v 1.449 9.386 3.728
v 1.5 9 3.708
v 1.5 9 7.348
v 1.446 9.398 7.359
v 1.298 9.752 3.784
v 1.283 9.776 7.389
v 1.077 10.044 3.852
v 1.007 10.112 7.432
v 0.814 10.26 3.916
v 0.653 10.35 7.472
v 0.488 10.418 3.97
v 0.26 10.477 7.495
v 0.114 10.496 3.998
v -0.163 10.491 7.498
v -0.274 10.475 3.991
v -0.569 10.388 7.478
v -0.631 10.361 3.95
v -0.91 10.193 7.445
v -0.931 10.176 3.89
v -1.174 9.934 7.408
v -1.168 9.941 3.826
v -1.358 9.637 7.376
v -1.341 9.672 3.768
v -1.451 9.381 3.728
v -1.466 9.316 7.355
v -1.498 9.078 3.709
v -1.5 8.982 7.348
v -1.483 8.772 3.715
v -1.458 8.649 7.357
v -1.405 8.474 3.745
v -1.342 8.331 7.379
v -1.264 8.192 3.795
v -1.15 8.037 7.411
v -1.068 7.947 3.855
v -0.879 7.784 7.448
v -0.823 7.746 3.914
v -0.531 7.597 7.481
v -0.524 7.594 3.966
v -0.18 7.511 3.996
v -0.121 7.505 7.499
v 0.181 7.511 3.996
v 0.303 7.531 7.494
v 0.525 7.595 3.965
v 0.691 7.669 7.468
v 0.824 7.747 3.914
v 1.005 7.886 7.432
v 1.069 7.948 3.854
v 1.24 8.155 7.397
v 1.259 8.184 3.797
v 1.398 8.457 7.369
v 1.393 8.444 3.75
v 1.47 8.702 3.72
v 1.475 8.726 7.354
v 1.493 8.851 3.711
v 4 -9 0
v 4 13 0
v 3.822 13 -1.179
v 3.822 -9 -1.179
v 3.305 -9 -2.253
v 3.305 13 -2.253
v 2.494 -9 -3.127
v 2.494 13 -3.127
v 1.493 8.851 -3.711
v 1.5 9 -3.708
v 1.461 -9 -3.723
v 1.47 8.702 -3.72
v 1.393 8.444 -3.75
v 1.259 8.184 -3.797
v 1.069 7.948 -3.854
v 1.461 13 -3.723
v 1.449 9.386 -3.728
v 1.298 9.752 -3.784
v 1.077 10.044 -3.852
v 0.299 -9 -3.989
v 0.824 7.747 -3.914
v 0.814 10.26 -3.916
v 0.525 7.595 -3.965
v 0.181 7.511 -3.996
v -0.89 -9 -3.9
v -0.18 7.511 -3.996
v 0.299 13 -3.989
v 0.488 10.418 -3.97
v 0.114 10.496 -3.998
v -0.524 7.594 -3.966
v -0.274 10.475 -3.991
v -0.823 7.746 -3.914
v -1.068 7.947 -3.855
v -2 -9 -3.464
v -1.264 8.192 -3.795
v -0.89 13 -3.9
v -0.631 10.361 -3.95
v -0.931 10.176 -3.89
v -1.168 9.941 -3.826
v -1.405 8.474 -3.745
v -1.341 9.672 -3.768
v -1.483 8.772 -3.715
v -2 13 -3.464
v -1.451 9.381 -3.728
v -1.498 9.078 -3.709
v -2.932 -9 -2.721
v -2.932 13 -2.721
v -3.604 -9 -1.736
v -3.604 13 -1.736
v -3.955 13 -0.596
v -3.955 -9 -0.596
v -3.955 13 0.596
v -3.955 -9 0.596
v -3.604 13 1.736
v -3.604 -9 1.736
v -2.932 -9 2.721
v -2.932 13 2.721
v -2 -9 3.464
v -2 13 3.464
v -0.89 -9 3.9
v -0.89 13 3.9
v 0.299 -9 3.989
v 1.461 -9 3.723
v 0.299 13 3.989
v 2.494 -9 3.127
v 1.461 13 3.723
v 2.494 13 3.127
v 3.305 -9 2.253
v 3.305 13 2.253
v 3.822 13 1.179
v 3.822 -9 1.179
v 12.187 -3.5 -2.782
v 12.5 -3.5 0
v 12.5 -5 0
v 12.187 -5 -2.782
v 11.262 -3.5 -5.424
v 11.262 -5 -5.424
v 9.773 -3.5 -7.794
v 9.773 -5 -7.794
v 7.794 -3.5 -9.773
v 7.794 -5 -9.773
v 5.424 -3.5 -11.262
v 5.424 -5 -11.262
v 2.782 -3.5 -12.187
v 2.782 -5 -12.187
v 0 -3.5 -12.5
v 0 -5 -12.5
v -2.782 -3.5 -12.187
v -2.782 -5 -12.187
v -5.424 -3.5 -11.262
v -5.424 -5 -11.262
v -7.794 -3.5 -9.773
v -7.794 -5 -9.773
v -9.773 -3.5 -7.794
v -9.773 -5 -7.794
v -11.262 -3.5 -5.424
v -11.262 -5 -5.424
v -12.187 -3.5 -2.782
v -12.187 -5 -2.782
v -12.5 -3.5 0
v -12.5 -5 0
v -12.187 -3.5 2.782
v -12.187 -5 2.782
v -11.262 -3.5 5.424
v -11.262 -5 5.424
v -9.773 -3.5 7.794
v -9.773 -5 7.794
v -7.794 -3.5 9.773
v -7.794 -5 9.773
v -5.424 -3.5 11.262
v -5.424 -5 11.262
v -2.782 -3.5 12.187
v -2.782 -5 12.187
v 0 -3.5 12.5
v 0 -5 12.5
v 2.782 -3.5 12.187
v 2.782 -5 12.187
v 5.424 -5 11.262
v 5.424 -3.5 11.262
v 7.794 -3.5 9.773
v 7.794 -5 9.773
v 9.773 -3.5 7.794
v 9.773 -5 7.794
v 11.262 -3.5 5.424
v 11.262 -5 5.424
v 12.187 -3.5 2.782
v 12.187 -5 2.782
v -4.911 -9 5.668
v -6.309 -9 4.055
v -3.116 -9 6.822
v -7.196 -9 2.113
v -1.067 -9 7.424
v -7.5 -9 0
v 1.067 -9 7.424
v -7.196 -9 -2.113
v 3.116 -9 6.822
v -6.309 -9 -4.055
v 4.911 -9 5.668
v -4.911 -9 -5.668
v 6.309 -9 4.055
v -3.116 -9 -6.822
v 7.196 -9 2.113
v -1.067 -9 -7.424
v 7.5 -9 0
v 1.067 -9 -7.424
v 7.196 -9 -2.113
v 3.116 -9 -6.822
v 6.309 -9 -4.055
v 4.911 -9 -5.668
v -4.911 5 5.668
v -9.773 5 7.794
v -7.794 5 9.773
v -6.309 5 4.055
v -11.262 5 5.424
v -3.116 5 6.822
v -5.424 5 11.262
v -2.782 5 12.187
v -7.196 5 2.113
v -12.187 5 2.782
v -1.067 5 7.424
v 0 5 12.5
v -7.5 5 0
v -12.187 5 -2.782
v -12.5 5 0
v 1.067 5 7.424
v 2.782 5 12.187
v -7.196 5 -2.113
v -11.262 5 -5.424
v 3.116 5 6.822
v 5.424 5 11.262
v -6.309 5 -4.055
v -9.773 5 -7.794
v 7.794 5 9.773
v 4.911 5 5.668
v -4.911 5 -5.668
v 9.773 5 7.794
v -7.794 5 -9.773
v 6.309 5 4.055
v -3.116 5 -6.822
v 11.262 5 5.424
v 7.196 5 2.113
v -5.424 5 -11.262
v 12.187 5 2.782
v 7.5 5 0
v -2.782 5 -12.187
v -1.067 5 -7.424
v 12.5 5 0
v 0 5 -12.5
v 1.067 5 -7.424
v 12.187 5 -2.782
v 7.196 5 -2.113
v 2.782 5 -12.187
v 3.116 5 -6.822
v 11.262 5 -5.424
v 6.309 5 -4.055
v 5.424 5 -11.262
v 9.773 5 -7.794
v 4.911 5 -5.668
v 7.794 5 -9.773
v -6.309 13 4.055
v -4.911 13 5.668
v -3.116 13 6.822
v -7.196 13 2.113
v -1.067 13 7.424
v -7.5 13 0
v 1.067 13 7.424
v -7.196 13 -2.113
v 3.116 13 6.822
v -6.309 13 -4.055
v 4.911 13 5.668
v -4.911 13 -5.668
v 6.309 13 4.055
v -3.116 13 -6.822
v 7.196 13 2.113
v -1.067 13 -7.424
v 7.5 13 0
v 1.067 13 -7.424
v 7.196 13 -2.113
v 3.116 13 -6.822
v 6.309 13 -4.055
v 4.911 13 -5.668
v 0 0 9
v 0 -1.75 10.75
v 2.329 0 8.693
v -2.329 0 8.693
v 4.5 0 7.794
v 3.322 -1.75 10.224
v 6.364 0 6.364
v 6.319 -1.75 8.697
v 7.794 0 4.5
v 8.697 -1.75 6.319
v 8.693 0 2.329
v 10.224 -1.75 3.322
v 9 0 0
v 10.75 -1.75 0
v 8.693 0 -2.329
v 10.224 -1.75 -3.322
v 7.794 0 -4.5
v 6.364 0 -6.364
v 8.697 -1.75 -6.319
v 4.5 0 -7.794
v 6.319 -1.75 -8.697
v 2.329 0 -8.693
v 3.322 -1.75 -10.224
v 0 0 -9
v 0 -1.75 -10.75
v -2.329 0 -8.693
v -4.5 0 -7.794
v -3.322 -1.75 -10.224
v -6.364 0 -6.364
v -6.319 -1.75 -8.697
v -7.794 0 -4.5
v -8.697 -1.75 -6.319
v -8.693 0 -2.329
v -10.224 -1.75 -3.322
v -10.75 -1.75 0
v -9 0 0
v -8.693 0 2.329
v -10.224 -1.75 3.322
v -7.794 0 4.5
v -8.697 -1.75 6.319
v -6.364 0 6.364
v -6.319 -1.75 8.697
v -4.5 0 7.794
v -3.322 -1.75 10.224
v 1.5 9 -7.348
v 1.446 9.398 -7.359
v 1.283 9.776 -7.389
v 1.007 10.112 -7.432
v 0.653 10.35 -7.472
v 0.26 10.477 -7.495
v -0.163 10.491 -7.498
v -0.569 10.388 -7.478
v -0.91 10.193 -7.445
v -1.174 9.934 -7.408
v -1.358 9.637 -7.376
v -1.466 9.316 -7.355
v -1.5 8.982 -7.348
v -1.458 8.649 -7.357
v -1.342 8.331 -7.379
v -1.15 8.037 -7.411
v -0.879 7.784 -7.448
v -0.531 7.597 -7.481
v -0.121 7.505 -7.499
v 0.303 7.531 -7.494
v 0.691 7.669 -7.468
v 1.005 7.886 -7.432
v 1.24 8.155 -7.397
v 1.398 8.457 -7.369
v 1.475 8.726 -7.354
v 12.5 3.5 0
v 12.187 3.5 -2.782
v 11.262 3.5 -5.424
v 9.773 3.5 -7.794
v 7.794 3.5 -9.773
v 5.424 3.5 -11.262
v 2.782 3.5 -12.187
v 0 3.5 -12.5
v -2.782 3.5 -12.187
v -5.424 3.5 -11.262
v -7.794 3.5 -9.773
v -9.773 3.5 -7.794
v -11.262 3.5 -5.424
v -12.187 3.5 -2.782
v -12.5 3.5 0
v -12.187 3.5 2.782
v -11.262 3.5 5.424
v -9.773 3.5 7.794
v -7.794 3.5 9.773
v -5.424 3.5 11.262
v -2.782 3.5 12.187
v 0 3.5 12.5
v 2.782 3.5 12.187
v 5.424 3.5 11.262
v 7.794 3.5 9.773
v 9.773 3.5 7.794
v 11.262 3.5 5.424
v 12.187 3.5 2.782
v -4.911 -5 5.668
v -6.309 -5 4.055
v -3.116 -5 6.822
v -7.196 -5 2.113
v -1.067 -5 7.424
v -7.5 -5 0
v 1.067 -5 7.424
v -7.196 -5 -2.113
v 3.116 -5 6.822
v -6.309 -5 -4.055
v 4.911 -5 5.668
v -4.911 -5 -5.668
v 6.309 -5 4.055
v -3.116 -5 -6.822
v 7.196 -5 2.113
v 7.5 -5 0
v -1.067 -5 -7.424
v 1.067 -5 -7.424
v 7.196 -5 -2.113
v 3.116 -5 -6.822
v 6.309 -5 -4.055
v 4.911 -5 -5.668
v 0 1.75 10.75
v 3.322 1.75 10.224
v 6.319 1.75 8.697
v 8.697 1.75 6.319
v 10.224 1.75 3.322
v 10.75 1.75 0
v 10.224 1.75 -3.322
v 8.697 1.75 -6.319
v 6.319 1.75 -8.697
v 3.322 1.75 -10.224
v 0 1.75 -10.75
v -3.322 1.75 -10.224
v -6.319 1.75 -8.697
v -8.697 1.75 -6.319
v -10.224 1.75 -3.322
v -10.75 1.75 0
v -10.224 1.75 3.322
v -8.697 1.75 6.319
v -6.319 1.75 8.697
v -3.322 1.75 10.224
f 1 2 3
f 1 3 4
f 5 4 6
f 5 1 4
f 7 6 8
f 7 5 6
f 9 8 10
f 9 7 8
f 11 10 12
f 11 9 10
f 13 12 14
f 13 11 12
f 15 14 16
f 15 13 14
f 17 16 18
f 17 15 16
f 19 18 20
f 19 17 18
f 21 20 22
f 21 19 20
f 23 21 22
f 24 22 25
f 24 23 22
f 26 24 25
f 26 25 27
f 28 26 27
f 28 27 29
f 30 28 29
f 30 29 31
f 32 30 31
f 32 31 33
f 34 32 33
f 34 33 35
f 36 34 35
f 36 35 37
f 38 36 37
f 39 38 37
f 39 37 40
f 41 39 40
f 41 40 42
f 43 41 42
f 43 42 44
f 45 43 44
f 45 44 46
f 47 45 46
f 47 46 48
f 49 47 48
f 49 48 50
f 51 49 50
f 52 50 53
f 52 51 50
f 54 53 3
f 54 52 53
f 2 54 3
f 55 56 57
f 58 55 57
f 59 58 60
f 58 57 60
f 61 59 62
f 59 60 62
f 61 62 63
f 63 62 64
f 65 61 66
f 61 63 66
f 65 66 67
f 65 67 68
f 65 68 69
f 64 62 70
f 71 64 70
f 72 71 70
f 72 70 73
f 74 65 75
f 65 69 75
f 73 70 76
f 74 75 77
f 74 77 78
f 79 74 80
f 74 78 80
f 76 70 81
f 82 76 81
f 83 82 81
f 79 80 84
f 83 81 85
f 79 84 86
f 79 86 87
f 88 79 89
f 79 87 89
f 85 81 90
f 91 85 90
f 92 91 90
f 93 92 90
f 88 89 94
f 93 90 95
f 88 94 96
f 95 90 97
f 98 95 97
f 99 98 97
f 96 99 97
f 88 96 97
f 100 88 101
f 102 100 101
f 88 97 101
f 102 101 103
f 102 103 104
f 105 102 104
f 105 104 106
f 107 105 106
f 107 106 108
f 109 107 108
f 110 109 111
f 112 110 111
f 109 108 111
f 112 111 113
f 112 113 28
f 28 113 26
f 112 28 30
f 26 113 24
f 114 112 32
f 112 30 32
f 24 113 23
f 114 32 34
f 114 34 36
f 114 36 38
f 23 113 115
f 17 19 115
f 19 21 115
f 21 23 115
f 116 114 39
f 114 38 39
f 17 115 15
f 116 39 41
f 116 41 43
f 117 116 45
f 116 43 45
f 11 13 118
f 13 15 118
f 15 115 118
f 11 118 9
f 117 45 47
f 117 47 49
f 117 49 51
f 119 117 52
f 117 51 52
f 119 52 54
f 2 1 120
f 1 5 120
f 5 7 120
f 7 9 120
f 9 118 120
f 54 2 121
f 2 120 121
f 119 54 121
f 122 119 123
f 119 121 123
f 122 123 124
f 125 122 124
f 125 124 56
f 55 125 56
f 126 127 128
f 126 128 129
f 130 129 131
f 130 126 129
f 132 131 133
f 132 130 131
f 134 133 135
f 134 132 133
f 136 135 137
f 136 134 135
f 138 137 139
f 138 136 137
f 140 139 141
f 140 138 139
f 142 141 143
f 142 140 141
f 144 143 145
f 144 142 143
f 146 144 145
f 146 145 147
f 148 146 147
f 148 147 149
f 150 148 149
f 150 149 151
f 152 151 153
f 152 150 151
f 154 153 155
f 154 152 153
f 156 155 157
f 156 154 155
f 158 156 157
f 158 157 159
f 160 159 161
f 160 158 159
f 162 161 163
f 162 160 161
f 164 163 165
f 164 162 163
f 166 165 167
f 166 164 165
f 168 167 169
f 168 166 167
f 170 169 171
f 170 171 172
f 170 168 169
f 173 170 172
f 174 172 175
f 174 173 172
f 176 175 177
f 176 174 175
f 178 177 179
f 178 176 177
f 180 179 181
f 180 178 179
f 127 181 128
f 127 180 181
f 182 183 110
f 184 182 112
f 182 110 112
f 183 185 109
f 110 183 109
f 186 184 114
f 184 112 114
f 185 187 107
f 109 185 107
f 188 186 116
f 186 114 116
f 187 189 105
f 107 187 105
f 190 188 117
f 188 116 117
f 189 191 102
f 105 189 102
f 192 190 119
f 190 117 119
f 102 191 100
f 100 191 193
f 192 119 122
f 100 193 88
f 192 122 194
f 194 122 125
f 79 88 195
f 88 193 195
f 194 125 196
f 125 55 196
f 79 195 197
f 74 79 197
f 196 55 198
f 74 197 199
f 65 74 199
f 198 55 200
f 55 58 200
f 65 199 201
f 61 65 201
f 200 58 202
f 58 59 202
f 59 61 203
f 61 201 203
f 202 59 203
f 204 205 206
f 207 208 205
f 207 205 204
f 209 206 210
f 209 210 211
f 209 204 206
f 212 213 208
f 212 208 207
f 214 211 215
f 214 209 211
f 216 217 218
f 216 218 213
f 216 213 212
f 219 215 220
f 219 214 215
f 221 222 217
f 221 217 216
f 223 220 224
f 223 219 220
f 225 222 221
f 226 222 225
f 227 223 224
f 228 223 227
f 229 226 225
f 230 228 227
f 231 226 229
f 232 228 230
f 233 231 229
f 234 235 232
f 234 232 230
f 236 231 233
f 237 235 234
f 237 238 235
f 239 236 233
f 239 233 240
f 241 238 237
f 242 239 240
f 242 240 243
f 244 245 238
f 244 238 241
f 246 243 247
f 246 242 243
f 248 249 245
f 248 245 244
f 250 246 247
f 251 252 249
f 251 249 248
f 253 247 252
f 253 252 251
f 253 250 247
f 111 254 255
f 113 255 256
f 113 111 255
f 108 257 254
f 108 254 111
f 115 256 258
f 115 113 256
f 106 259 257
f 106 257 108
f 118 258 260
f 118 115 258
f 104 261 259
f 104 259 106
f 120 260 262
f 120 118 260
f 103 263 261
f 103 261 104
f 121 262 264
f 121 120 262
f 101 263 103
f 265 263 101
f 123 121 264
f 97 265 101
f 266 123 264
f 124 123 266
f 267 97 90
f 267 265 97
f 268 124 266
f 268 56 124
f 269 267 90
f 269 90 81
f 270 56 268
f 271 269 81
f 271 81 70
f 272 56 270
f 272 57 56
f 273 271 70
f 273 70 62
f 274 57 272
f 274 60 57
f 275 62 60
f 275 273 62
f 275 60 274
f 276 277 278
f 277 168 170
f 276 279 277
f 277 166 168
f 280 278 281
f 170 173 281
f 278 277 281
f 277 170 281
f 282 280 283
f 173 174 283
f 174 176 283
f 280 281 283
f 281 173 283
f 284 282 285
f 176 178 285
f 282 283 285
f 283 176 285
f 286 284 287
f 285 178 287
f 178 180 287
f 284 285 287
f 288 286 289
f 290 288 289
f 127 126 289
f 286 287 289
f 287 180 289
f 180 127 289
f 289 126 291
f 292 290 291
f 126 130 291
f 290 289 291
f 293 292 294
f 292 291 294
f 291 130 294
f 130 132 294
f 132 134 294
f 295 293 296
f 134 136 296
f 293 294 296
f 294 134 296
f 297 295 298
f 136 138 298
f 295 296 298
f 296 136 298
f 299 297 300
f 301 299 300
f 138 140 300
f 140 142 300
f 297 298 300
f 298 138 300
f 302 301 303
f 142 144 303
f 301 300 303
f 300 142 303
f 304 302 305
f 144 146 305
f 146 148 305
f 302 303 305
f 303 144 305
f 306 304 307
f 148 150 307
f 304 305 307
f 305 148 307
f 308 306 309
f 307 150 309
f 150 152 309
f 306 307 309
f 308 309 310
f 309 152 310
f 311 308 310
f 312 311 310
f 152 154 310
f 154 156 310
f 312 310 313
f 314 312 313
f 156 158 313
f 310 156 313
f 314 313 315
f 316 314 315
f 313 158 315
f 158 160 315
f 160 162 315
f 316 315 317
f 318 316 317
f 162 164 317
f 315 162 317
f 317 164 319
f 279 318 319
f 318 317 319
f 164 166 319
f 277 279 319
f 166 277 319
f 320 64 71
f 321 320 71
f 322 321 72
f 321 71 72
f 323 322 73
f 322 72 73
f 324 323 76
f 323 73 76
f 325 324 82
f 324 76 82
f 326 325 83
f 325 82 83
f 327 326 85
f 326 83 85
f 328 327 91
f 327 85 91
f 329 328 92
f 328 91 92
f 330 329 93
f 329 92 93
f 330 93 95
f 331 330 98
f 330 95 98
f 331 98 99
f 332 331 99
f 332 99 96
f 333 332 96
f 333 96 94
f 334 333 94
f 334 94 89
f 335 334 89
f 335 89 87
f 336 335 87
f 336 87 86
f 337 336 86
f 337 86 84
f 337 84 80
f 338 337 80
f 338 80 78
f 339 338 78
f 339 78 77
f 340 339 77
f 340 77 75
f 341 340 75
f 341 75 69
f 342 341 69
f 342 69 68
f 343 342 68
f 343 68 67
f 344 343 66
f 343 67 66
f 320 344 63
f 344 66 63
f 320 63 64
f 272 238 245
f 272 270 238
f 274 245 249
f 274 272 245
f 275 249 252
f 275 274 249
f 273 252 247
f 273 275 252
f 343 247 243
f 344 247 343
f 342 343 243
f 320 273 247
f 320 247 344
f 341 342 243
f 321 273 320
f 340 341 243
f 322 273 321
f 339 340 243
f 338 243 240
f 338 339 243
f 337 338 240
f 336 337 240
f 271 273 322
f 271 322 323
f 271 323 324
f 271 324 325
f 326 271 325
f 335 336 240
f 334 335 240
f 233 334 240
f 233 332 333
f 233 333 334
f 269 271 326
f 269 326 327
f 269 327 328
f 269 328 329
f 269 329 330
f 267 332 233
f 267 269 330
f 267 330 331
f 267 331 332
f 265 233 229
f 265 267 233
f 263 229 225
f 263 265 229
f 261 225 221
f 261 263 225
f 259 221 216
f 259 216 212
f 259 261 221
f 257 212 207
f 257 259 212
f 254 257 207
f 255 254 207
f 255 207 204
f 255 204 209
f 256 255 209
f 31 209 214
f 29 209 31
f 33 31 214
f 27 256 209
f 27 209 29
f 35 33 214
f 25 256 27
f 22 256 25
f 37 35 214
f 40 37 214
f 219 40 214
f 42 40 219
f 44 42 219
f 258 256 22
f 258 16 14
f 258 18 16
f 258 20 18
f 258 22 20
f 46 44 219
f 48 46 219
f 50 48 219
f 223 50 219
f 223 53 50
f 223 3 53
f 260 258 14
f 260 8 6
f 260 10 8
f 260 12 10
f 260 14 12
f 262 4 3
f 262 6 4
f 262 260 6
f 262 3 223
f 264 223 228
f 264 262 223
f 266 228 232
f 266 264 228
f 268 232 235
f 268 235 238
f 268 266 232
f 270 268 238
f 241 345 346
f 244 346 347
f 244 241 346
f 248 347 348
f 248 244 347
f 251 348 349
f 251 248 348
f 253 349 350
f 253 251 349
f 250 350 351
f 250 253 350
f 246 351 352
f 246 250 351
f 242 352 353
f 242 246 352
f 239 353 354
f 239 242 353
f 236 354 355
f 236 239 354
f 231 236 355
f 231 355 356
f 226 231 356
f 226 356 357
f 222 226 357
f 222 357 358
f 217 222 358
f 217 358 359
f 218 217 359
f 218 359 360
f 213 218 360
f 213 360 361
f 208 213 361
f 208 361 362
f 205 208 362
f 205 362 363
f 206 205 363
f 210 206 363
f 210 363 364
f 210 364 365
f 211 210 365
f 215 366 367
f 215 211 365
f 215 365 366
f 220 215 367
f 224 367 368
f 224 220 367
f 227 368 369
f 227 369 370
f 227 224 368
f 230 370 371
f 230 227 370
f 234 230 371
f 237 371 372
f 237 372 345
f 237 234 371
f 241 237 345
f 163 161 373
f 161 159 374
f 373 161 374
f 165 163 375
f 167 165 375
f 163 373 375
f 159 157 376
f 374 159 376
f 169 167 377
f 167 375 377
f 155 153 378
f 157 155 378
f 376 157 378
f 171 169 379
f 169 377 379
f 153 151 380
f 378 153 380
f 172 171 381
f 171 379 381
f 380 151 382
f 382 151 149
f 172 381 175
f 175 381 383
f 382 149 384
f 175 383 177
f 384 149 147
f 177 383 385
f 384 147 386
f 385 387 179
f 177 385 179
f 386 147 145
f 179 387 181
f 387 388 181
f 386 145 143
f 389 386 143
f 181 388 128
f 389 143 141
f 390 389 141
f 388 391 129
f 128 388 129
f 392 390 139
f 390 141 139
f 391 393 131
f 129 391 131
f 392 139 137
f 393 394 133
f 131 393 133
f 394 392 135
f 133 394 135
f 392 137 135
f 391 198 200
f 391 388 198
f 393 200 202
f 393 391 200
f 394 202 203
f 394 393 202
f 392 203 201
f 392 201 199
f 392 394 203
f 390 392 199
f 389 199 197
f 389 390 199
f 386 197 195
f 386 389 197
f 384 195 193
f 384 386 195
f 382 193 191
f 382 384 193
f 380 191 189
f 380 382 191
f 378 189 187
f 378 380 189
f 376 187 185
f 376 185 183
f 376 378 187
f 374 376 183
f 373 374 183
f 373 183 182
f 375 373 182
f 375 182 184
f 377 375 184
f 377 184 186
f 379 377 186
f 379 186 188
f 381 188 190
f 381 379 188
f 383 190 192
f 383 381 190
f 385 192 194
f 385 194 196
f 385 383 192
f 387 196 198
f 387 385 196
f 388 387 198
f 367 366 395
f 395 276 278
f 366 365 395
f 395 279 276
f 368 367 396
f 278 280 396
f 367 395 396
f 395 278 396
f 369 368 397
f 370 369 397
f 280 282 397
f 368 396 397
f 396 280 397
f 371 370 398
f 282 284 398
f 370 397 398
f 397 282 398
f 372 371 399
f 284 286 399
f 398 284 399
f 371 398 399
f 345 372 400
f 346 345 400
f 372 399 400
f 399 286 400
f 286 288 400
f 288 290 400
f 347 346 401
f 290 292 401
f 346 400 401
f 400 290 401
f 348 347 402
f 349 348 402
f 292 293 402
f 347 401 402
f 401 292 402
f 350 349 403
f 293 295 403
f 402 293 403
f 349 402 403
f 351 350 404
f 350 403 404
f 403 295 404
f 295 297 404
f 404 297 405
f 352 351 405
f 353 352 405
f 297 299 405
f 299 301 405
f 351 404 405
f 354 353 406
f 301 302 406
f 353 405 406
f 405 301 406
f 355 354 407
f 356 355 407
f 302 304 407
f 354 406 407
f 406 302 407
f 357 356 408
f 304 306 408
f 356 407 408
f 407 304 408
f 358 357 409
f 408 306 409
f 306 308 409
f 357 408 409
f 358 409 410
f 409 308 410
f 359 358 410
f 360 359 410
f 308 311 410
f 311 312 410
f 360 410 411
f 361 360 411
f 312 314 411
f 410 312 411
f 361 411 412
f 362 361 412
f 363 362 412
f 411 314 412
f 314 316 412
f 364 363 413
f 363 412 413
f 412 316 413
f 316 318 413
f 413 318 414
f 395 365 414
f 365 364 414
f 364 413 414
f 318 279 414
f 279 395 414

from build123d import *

# Parameters (mm, degrees)
SKETCH1_R                = 7.5
SKETCH1_R_2              = 4
BOSS_EXTRUDE1_DEPTH      = 13
BOSS_EXTRUDE1_DEPTH_BACK = 9
SKETCH1_4_R              = 12.5
SKETCH1_4_R_2            = 7.5
BOSS_EXTRUDE2_DEPTH      = 5
BOSS_EXTRUDE2_DEPTH_BACK = 5
SKETCH3_R                = 1.5
CUT_EXTRUDE1_DEPTH       = 13.5
CUT_EXTRUDE1_DEPTH_BACK  = 13.5


with BuildPart() as part:
    # Sketch1 → Boss-Extrude1 (new body, two sides)
    with BuildSketch(Plane(origin=(0, 0, 0), x_dir=(1, 0, 0), z_dir=(0, 1, 0))) as boss_extrude1_sk:
        Circle(SKETCH1_R)
        Circle(SKETCH1_R_2, mode=Mode.SUBTRACT)
    extrude(amount=BOSS_EXTRUDE1_DEPTH)
    extrude(boss_extrude1_sk.sketch, amount=-BOSS_EXTRUDE1_DEPTH_BACK)

    # Sketch1<4> → Boss-Extrude2 (add, two sides)
    with BuildSketch(Plane(origin=(0, 0, 0), x_dir=(1, 0, 0), z_dir=(0, 1, 0))) as boss_extrude2_sk:
        Circle(SKETCH1_4_R)
        Circle(SKETCH1_4_R_2, mode=Mode.SUBTRACT)
    extrude(amount=BOSS_EXTRUDE2_DEPTH)
    extrude(boss_extrude2_sk.sketch, amount=-BOSS_EXTRUDE2_DEPTH_BACK)

    # Sketch2 → Cut-Revolve1 (revolve, cut)
    with BuildSketch(Plane(origin=(0, 0, 0), x_dir=(0, 0, -1), z_dir=(1, 0, 0))):
        Polygon((-12.5, 3.5), (-9, 0), (-12.5, -3.5), align=None)
    revolve(axis=Axis((0, 0, 0), (0, 1, 0)), mode=Mode.SUBTRACT)

    # Sketch3 → Cut-Extrude1 (cut, two sides)
    with BuildSketch(Plane.XY) as cut_extrude1_sk:
        with Locations((0, 9)):
            Circle(SKETCH3_R)
    extrude(amount=CUT_EXTRUDE1_DEPTH, mode=Mode.SUBTRACT)
    extrude(cut_extrude1_sk.sketch, amount=-CUT_EXTRUDE1_DEPTH_BACK, mode=Mode.SUBTRACT)


solid = part.part
